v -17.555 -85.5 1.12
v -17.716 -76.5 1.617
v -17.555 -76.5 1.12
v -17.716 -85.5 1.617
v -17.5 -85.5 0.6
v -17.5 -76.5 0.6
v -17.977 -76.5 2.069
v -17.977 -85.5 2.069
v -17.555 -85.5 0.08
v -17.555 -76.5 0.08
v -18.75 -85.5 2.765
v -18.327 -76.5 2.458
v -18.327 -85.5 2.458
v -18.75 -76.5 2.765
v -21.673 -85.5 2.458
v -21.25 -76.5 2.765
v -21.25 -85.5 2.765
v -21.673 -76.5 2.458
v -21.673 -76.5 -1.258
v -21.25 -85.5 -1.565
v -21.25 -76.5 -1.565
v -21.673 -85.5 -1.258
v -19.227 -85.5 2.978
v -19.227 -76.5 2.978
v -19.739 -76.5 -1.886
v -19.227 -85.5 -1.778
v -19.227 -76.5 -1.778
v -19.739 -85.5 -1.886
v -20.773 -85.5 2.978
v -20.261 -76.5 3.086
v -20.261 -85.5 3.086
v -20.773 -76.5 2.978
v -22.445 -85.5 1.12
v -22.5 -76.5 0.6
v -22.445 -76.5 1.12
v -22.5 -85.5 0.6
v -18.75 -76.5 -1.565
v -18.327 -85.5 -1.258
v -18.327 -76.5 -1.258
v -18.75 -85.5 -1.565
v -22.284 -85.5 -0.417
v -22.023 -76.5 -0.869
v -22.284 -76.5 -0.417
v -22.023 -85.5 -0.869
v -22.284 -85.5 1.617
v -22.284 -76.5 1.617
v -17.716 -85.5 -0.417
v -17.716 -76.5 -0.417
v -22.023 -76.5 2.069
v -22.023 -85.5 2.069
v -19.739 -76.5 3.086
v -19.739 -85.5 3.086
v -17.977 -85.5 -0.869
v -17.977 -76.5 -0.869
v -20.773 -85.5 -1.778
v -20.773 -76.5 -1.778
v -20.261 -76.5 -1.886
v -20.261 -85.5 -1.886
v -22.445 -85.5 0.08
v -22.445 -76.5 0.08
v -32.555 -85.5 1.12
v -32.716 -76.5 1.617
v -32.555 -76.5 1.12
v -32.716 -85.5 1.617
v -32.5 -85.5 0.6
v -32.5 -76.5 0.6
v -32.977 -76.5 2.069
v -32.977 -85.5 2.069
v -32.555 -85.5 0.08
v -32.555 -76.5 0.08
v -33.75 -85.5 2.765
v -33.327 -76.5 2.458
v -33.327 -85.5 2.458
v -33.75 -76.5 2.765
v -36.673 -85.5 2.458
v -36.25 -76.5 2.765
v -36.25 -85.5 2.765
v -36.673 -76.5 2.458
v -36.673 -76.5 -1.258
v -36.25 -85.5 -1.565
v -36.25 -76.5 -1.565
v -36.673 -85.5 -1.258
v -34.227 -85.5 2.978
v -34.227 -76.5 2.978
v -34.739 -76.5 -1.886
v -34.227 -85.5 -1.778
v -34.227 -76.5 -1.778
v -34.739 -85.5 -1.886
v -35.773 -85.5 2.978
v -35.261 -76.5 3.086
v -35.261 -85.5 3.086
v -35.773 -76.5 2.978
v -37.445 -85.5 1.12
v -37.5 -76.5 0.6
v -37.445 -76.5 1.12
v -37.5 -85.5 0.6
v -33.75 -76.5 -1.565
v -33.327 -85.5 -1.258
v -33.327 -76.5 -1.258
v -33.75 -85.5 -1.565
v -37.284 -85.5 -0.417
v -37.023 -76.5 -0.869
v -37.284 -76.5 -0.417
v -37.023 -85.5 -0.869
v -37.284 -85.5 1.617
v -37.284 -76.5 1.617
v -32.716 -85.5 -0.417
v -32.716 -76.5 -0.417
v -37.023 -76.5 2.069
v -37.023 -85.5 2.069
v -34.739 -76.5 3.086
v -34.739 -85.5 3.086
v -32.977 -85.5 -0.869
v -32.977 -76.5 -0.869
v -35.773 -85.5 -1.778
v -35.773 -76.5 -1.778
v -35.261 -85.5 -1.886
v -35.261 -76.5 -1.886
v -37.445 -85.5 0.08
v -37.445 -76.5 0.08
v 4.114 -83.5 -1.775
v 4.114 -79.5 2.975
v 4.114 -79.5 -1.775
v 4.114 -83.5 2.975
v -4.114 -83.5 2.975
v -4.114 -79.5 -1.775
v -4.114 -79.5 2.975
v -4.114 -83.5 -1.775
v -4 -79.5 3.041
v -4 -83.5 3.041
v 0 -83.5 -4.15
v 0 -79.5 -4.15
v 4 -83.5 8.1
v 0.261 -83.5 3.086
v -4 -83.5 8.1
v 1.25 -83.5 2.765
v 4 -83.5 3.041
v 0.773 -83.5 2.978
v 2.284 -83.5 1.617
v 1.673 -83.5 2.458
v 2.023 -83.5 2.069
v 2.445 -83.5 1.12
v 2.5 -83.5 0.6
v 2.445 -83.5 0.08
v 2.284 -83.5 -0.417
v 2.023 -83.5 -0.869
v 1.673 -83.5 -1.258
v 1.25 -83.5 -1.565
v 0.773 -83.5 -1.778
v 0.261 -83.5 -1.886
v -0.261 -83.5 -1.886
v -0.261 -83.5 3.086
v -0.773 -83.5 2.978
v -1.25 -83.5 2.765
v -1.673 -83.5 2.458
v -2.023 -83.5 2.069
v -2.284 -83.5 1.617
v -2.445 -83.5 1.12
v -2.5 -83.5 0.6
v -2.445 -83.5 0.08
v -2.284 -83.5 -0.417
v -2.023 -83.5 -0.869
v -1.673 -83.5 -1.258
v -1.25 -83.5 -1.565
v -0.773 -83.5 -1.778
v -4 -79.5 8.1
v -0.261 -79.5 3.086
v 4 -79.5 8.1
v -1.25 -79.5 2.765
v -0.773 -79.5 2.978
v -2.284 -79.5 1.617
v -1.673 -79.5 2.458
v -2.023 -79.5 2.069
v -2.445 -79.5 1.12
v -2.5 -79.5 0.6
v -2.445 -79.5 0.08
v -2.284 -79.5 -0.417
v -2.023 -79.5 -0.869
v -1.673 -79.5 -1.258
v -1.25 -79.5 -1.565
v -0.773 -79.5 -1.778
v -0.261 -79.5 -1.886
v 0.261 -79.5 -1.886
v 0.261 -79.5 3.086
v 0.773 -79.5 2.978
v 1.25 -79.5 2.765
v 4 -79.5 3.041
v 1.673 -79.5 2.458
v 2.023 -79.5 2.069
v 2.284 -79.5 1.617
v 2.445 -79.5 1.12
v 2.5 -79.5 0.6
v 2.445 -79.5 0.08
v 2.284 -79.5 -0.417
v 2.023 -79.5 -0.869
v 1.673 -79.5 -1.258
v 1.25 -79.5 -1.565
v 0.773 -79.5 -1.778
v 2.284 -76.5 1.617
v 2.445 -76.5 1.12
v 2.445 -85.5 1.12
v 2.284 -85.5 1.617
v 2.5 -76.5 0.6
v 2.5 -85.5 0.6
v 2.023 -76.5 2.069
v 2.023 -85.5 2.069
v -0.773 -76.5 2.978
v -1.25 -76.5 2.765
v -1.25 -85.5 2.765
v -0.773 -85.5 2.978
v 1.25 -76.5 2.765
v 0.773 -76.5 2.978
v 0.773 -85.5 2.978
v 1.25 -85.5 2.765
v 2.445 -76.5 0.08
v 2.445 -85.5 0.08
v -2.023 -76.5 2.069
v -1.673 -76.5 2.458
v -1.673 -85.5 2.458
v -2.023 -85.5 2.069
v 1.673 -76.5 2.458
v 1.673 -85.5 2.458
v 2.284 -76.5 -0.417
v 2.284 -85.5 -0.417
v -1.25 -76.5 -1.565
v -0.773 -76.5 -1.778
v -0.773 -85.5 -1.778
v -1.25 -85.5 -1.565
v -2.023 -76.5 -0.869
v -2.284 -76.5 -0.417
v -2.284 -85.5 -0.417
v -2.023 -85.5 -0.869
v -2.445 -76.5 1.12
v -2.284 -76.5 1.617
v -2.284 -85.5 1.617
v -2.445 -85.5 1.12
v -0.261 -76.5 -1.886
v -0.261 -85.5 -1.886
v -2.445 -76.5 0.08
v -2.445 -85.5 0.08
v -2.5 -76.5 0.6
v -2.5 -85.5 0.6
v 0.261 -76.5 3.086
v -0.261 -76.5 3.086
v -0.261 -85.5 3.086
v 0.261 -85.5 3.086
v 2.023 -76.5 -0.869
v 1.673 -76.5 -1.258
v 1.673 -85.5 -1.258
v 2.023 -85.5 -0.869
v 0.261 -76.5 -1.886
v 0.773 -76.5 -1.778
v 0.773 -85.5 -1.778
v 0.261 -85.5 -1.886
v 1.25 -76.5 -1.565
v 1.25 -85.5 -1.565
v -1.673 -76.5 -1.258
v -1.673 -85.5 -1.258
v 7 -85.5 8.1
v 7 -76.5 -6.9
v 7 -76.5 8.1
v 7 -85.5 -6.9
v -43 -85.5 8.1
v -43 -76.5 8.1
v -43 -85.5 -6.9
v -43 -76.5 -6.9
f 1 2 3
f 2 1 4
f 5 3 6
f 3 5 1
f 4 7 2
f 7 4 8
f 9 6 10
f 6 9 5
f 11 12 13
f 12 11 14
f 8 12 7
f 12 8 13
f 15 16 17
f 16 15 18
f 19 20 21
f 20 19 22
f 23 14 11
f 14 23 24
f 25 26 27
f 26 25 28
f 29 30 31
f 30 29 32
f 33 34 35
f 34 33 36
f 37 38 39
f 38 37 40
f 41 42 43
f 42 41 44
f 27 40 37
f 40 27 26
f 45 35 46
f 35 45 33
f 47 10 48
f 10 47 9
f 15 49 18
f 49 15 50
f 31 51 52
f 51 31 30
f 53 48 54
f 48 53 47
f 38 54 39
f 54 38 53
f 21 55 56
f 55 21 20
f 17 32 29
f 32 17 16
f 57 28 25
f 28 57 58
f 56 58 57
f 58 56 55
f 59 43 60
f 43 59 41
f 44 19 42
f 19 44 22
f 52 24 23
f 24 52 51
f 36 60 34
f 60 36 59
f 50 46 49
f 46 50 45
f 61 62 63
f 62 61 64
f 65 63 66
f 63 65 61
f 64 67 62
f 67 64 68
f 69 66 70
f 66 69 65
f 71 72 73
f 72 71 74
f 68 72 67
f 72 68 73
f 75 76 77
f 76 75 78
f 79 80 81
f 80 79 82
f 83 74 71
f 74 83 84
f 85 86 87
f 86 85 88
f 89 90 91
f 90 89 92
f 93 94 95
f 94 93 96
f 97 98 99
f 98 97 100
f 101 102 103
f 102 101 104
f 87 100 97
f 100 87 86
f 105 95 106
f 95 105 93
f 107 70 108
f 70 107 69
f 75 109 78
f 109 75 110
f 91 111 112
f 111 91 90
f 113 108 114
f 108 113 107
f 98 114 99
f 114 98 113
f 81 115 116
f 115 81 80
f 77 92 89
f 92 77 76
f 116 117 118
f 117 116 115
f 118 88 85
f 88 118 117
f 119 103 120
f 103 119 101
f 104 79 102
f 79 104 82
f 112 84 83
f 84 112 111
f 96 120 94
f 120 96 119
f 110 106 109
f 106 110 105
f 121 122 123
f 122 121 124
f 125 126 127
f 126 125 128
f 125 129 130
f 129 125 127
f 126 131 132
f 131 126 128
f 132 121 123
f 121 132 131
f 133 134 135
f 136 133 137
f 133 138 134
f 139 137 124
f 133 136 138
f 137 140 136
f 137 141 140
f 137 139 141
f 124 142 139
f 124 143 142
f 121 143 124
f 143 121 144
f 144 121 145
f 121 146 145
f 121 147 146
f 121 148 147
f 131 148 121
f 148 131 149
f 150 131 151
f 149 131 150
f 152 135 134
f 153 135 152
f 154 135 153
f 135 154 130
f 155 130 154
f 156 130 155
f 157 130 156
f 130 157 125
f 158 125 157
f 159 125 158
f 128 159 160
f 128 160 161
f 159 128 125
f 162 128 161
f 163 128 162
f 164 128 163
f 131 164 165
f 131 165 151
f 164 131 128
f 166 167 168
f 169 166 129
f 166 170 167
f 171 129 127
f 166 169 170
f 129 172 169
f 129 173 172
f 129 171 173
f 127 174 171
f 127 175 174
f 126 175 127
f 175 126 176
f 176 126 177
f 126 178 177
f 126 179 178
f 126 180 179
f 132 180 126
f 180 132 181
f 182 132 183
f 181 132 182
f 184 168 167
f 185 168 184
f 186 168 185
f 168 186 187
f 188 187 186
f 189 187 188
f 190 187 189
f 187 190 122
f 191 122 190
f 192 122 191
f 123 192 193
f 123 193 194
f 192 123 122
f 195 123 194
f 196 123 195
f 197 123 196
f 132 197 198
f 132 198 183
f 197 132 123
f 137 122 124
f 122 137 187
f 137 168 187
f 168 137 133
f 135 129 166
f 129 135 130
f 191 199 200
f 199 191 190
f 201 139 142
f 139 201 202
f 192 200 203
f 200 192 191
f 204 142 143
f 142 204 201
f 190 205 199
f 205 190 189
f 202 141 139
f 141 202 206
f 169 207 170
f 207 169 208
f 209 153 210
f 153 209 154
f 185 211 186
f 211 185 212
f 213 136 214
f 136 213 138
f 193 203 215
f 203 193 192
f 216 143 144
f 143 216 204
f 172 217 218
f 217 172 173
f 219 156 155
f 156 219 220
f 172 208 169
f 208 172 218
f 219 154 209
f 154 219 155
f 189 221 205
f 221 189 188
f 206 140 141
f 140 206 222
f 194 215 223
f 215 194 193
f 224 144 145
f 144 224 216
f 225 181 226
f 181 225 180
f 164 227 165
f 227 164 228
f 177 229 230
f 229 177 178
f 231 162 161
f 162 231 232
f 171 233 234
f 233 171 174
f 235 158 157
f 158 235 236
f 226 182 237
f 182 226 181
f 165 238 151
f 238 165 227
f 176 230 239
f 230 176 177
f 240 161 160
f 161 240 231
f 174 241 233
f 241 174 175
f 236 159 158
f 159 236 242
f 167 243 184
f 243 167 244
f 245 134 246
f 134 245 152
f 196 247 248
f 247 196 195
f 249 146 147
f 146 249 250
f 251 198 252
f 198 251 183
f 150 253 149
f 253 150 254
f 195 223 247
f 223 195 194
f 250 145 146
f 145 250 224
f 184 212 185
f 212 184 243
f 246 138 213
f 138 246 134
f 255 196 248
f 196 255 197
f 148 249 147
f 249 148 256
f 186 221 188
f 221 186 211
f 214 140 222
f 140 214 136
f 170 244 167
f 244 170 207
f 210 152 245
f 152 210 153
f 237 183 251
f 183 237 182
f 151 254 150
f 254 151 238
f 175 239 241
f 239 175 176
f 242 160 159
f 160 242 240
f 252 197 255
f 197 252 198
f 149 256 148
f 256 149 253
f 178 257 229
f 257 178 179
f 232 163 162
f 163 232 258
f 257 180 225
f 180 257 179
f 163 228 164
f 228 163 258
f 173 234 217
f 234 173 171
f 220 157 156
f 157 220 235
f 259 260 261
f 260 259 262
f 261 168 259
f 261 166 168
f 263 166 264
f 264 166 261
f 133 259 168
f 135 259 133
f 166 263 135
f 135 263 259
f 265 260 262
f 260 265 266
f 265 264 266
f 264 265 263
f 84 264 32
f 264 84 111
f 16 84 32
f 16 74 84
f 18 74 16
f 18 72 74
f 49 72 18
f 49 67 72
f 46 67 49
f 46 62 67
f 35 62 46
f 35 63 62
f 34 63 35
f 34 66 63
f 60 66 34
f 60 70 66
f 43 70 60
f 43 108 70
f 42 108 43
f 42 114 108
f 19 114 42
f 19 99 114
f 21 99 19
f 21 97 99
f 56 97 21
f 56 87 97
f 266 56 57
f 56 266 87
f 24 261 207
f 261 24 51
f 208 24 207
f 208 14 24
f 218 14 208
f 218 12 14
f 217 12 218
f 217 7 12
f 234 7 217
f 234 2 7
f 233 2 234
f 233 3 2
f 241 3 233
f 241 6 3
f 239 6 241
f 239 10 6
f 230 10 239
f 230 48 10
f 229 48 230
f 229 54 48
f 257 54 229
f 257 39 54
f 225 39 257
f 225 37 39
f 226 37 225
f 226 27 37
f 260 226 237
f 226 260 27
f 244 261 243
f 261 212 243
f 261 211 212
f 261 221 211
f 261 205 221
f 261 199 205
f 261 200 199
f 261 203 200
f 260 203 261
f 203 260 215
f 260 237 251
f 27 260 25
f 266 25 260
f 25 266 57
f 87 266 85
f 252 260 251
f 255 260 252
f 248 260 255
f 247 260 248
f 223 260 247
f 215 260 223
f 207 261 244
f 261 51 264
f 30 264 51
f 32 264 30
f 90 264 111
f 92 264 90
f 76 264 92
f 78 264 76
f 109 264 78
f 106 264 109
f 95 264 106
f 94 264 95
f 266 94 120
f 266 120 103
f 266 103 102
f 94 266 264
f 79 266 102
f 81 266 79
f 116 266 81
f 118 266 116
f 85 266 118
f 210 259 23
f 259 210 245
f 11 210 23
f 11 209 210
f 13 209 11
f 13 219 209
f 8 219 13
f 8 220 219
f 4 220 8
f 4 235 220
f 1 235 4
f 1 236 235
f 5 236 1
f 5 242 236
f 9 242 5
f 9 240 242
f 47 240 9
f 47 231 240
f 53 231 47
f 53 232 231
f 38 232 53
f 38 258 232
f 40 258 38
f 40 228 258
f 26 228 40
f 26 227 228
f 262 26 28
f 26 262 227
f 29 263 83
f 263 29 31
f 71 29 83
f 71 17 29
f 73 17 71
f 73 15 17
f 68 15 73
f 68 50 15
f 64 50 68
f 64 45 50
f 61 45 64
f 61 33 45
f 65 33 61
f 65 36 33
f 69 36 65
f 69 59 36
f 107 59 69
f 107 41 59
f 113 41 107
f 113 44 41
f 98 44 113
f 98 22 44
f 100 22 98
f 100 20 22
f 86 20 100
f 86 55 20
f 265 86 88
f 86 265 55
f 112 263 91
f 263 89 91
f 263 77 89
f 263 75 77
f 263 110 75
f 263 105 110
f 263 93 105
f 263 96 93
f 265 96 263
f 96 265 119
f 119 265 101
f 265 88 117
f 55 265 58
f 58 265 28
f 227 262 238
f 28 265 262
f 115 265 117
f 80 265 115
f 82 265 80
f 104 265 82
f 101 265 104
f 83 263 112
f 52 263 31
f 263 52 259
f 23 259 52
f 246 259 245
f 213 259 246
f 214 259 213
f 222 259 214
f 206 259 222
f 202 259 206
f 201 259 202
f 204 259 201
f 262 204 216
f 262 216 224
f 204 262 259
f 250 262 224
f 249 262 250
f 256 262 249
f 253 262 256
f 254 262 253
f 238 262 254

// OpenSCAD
include <BOSL/constants.scad>
use <BOSL/transforms.scad>
use <BOSL/shapes.scad>

//Load cell properties
lcX = 80;
lcY = 12.7;
lcZ = lcY;

x = lcX+5;
y = 20;
z = 65;
wall = 1.2;

$fn = 30;
connector = "rj45"; //"rj45" or "none"
y2 = 20;
master = true;
d_rod = 10.5;


module hook(){
   difference(){
      linear_extrude(7)import("haken.svg");
      translate([15,40,3.5])ycyl(d=5,h=20);
      translate([15,38.5,3.5])ycyl(d=9,h=4,$fn=6);
      rotate([5,-4,0])translate([20,25,5])cuboid([40,50,5]);
      }
}




module rj45(){
   difference(){
      import("parts/keystone.stl");
   }
}


 module screwshaft(d1=4,d2=2,h=5){
        translate([0,0,0])rotate([90,0,0])difference(){
            cylinder(d=d1,h=h);
            cylinder(d=d2,h=h);
        }
    }
    
module holes(dMount = 5,dLoad = 5){
  
   rotate([90,0,0]){
   //holes that fit into the load cell
        for(i=[[20,0,-30],[35,0,-30]]){
            translate(i)cylinder(h = 60, d = dMount);
        }
            //hole for mount
        for(i=[[-20,0,-30],[-35,0,-30]]){

        translate(i)cylinder(h = 60, d = dLoad);   
        }
     }
    }
    
module trapez(x1 = 30, x2 = 20, y = 5){
   polygon(points=[[-x1/2,0],[-x2/2,y],[x2/2,y],[x1/2,0]]);
}

module rod_cross(d= d_rod, h = 100){
   translate([0,0,-h/2])cylinder(d = d_rod, h = h);
   translate([-h/2,0,0])rotate([0,90,0])cylinder(d = d_rod, h = h);
}


module connectorA(){
   x = 20;
   y = 20;
   z = 20;
   height = 7;
   
   difference(){
      cuboid([x,y,z]);
      translate([0,9,0])rotate([90,0,0]){
            rotate([0,0,90])cylinder(h = 3.5, d=8, $fn = 6);
            translate([0,10,1.7])cube([7,20,3.5],center = true);
           translate([0,0,-2.5])cylinder(d = 5, h =10);
          }
          translate([0,-2,0])rod_cross();

   }
   translate([0,-y/2-height,-z/2])linear_extrude(z)trapez(30,20,height);
   
   //screw holder
  
}
module loadcell(){
    difference(){
    cube([lcX,lcY,lcZ],center = true);
    holes();}
}


module connectorB(){
   xCh = lcX;
   z = 20;
   y = 12;
   height = 7;

   difference(){
      cuboid([xCh,y,z]);
      translate([0,y/2-height-0.2,-z/2])linear_extrude(z)trapez(30.8,20.8,height+0.2);
      holes();
      back(30)holes(10,0);
   }

}

module load_connector(){
    difference(){
       left(18)fwd(21)cuboid([x-35,9,y-5]);
        holes();
        fwd(10)rotate([90,0,0])cylinder(h=20,d=5);
       translate([0,-19.5,0])rotate([90,0,0]){
            rotate([0,0,90])cylinder(h = 4, d=9.5, $fn = 6);
            translate([0,10,2])cube([8,20,4],center = true);
           translate([0,0,-2.5])cylinder(d = 5, h =10);
          }
    }
 }
 
 
 
module case(x=x,y=y,z=z,a=1){
    difference(){
       cuboid([x+wall*2,y+wall*2,z+wall*2],fillet = 3, edges=EDGES_Y_ALL);
        translate([0,-a*wall,0])cuboid([x,y+wall,z],fillet = 3, edges=EDGES_Y_ALL);
           

    }
}

module lolin_lid(){
   h_lol =5.5;
   module lolinmount(){
    
    lolinypos =20;
    d1 = 4;
    d2 = 2;
    x_lol=26;
    y_lol=49.5;
    lolinpos = 0;
    color("blue"){
    translate([-4,-1,0]){
    translate([-lolinpos-9,22.5,0])difference(){
        up(h_lol/2)right(10)cube([x_lol,d1,h_lol],center = true);//cylinder(h = h_lol,d =d1);
        up(1)cylinder(h = h_lol,d =d2);
    }
    translate([-lolinpos+12,-16,0])difference(){
        up(h_lol/2)left(11)fwd(2)cube([x_lol,d1*2,h_lol],center = true);
        //cylinder(h = h_lol,d =d1);
        up(1)cylinder(h = h_lol,d =d2);
    }
}
}
             
}
      //rj45 jack
      if(connector == "rj45"){
         translate([28.7,-0.5,66])rj45();
      }
      y = y2;
      difference(){
         union(){
            case(x,y,z,-1);
             for(i=[[-x/2+wall+1,y/2+wall,-z/2+wall+01],
        [x/2-wall-1,y/2+wall,z/2-wall-1],
        [x/2-wall-1,y/2+wall,-z/2+wall+1],
        [-x/2+wall+1,y/2+wall,z/2-wall-1] ]){
        translate(i)screwshaft(6,0,y+1);
        }
       }
         if(master){
         //BATTERY connector
         translate([x/2+1,-y/2+h_lol+3.7,7.2-6-5])cuboid([2*wall,6,7]);
         //USB connector
         translate([x/2+1,-y/2+h_lol+2.5,-8.5-6-5])cuboid([2*wall,4,8]);
         
         //tara button hole
         translate([x/2+1,0,17])cuboid([2*wall,6,6]);
         }
         //rod hole
       translate([0,50,20.5])rotate([90,0,0])cylinder(d = d_rod, h = 100);
         //rj45 hole
         if(connector == "rj45"){
         translate([-x/2,-1,10])cuboid([3,16,20]);
            }
       for(i=[[-x/2+wall+0.5,y/2-wall,-z/2+wall+0.5],
        [x/2-wall-0.5,y/2-wall,z/2-wall-0.5],
        [x/2-wall-0.5,y/2-wall,-z/2+wall+0.5],
        [-x/2+wall+0.5,y/2-wall,z/2-wall-0.5] ]){
        translate(i){
            screwshaft(4,0,y);
            back(5)screwshaft(2,0,y);
        }
    }

    }
    *translate([-0,-y/2+h_lol,10-6-5])rotate([90,0,0])import("parts/lolin32_lite.stl");
    
    //mounting brackets for lolin lite
    if(master){
    translate([17,-y/2,-15])rotate([-90,90,0])lolinmount();
    }
    
}
module load_cell_case(){
   difference(){ 
   union(){
       color("green")case();
       for(i=[[-x/2+wall+0.5,y/2-wall,-z/2+wall+0.5],
           [x/2-wall-0.5,y/2-wall,z/2-wall-0.5],
           [x/2-wall-0.5,y/2-wall,-z/2+wall+0.5],
           [-x/2+wall+0.5,y/2-wall,z/2-wall-0.5] ]){
           translate(i)screwshaft(4,2,y);
       }}
    fwd(wall/2)up(20.5)rotate([90,0,0])rod_cross();
    // hole for screw 
    fwd(wall/2)down(-z/2+10)cylinder(d = 5,h = 20);
    // hole for load hook
    fwd(wall/2)down(z/2+10)cylinder(d = 10,h = 20);   
   
       }
}

up(40)rotate([-90,0,0])lolin_lid();


rotate([-90,0,0])load_cell_case();
up(wall/2)back(22.5)connectorA();
*fwd(60)up(wall/2)back(22.5)translate([0,-16,0])connectorB();

!fwd(60)up(wall/2)load_connector();

*fwd(8)loadcell();
*hook();
